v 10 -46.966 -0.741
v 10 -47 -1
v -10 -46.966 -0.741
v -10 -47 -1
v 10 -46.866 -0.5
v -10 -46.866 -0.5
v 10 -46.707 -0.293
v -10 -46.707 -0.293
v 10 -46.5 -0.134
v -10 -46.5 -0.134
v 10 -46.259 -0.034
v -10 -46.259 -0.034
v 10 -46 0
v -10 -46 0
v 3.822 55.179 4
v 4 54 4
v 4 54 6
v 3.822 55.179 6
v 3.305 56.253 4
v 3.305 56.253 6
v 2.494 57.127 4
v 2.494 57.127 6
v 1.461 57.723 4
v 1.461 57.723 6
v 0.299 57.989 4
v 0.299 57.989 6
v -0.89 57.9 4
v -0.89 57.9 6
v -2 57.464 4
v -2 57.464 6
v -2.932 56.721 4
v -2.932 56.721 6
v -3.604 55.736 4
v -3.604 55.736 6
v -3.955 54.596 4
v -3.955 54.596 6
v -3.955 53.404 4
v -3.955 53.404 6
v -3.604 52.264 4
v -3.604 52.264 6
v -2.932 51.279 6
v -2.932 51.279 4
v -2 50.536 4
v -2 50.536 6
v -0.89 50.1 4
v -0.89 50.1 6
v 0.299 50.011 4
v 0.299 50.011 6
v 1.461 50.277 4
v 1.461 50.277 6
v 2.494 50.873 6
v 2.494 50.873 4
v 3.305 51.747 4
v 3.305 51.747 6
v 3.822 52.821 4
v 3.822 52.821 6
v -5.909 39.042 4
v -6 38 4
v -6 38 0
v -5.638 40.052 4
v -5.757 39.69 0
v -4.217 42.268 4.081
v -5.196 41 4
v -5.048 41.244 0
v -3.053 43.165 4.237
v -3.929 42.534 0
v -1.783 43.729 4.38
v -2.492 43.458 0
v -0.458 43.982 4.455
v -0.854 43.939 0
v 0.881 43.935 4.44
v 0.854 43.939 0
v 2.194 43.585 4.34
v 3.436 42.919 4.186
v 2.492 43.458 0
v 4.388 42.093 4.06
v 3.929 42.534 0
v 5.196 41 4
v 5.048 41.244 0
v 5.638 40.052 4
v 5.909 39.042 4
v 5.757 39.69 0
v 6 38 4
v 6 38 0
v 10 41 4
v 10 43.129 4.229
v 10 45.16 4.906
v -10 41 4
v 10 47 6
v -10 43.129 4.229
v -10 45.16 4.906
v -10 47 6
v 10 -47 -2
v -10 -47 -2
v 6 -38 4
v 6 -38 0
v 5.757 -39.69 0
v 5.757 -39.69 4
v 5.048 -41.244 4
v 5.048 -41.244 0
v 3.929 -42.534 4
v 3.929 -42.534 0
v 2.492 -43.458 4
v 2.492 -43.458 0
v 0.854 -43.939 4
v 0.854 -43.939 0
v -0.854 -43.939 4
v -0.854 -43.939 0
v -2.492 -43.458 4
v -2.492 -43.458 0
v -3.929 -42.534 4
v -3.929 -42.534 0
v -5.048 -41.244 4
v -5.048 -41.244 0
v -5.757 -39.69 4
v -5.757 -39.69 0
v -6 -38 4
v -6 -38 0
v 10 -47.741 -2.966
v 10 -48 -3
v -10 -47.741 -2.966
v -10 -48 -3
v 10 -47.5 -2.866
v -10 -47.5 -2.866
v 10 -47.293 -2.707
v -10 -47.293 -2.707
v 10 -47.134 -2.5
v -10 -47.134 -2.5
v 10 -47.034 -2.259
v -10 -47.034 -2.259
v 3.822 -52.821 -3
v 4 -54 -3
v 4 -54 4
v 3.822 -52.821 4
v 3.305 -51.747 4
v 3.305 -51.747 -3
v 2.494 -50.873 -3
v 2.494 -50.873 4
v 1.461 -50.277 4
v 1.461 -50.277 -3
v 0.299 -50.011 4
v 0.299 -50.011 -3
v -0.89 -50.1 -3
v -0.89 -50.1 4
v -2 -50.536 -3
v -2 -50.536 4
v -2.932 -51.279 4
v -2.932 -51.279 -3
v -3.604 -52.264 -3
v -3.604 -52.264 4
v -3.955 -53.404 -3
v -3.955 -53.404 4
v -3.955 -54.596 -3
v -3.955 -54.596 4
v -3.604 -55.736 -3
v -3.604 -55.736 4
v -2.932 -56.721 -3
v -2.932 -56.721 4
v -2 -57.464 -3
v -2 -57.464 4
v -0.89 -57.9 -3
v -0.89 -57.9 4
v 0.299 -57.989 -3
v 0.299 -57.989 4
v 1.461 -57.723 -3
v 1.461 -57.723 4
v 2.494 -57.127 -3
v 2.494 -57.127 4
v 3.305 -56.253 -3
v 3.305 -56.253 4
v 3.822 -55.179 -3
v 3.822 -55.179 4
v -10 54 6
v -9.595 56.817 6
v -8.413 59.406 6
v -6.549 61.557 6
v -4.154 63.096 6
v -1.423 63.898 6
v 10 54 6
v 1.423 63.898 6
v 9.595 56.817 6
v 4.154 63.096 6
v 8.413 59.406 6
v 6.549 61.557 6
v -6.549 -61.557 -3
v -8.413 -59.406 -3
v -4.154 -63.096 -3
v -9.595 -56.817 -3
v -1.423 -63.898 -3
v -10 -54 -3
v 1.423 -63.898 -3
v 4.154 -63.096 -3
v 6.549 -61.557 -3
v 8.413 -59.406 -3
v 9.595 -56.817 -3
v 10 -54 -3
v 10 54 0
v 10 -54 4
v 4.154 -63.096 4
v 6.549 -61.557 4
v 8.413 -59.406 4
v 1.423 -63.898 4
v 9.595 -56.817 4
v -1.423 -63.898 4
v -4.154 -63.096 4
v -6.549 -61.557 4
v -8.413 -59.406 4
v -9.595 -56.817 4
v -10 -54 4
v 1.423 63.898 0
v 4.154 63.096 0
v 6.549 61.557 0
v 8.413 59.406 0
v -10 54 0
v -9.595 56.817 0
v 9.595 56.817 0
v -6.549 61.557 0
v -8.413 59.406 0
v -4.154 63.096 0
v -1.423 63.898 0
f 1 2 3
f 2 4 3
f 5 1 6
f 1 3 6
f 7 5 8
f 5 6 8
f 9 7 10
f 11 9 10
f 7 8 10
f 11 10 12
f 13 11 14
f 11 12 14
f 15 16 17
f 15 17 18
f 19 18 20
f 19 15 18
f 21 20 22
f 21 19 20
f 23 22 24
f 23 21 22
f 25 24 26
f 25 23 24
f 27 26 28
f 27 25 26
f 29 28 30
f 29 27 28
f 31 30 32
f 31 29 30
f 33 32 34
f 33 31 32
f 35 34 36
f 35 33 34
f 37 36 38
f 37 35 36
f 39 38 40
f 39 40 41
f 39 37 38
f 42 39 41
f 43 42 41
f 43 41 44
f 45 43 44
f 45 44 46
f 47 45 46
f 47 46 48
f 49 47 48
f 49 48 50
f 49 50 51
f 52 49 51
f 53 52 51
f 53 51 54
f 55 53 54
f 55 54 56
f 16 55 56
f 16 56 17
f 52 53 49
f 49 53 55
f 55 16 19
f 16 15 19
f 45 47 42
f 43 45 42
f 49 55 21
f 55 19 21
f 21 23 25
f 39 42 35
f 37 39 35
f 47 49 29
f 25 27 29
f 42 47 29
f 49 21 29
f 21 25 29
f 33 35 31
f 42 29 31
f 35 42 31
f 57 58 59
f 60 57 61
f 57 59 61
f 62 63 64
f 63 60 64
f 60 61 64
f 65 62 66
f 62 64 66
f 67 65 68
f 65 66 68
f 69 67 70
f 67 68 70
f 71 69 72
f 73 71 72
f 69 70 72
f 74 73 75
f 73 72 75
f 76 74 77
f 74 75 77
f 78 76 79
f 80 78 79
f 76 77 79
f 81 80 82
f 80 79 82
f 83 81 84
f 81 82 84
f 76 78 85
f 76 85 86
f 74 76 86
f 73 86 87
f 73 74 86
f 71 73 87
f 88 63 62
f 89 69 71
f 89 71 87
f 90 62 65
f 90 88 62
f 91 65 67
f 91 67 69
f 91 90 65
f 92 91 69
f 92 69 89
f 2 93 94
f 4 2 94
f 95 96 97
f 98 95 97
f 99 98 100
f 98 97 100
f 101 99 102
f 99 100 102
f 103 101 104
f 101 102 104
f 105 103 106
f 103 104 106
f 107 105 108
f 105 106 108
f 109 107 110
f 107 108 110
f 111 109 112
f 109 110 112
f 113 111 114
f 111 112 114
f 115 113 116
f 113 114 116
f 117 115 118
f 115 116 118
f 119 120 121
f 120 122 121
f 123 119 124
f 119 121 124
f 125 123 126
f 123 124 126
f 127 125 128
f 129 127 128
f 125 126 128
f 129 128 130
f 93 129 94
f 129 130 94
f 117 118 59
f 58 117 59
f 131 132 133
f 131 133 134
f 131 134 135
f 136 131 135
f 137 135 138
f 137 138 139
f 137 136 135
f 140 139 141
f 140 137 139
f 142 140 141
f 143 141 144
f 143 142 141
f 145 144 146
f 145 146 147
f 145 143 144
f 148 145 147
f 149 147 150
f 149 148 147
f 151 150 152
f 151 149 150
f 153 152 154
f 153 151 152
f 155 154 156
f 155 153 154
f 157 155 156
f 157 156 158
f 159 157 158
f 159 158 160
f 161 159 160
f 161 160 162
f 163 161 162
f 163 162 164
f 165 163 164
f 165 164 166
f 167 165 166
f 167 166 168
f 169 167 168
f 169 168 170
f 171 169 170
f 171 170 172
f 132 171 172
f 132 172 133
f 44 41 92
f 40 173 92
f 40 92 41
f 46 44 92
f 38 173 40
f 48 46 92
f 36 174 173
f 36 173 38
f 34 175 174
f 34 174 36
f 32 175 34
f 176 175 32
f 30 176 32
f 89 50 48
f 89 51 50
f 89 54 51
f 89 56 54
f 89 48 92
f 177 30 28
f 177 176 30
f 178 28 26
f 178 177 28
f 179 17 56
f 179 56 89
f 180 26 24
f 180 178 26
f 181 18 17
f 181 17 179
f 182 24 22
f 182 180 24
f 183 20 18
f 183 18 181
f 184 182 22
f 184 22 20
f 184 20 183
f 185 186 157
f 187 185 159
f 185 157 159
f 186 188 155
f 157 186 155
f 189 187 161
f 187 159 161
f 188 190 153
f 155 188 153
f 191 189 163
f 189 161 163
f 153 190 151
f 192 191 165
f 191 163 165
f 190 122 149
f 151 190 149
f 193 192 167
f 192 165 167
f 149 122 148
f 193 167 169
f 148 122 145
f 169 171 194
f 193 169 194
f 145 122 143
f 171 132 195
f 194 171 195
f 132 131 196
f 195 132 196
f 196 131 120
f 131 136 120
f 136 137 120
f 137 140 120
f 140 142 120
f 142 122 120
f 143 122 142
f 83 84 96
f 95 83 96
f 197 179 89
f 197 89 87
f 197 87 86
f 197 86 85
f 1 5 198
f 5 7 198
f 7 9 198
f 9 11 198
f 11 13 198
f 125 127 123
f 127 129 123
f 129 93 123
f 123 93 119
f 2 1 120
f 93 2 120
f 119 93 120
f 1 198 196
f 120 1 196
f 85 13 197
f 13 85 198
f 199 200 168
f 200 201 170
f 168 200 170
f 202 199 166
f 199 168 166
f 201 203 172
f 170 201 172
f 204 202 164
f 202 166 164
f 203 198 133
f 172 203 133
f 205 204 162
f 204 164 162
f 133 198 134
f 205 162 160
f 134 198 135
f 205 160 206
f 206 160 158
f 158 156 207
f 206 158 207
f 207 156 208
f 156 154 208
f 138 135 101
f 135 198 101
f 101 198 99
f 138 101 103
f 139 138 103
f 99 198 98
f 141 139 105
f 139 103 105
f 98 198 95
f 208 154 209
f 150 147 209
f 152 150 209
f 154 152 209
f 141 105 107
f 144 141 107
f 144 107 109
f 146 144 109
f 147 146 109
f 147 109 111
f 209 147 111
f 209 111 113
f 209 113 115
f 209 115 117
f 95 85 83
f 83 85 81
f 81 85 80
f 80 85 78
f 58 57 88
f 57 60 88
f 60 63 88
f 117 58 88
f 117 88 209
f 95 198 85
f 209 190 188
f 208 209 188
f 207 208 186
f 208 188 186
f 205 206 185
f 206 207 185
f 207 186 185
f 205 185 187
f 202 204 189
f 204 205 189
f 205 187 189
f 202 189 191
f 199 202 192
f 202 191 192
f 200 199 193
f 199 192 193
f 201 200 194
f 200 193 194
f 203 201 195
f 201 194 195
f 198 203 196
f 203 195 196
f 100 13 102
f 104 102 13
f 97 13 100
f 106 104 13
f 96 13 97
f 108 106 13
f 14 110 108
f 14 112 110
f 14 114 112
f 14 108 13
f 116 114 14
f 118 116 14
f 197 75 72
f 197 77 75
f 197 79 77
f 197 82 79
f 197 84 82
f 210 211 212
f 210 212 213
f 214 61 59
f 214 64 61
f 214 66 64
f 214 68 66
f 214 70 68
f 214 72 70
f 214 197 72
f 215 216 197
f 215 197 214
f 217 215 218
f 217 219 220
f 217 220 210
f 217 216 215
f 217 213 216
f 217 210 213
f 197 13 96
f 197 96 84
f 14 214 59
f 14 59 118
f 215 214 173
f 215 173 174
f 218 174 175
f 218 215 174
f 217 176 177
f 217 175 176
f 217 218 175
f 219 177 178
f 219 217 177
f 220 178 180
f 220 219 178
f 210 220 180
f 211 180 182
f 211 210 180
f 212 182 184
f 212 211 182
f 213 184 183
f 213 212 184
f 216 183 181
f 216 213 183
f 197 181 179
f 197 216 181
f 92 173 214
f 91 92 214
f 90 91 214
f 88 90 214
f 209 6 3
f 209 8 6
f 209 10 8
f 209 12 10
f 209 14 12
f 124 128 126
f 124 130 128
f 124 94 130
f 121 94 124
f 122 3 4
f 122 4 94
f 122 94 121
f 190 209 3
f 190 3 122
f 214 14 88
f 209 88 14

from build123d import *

# Parameters (mm, degrees)
CROQUIS1_R              = 4
SALIENTE_EXTRUIR1_DEPTH = 4
SALIENTE_EXTRUIR2_START = -3
CROQUIS1_5_R            = 4
SALIENTE_EXTRUIR2_DEPTH = 3
REDONDEO2_R             = 1
CROQUIS1_6_R            = 4
SALIENTE_EXTRUIR3_DEPTH = 6
REDONDEO1_R             = 10


with BuildPart() as part:
    # Croquis1 → Saliente-Extruir1 (new body)
    with BuildSketch(Plane.XY):
        with BuildLine():
            Line((10, 54), (10, -54))
            ThreePointArc((10, -54), (0, -64), (-10, -54))
            Line((-10, -54), (-10, 54))
            ThreePointArc((-10, 54), (0, 64), (10, 54))
        make_face()
        with Locations((0, -54)):
            Circle(CROQUIS1_R, mode=Mode.SUBTRACT)
        with BuildLine():
            Line((6, 38), (6, -38))
            ThreePointArc((6, -38), (0, -44), (-6, -38))
            Line((-6, -38), (-6, 38))
            ThreePointArc((-6, 38), (0, 44), (6, 38))
        make_face(mode=Mode.SUBTRACT)
    extrude(amount=SALIENTE_EXTRUIR1_DEPTH)

    # Croquis1<5> → Saliente-Extruir2 (add)
    with BuildSketch(Plane.XY.offset(SALIENTE_EXTRUIR2_START)):
        with BuildLine():
            Line((10, -54), (10, -47))
            Line((10, -47), (-10, -47))
            Line((-10, -47), (-10, -54))
            ThreePointArc((-10, -54), (0, -64), (10, -54))
        make_face()
        with Locations((0, -54)):
            Circle(CROQUIS1_5_R, mode=Mode.SUBTRACT)
    extrude(amount=SALIENTE_EXTRUIR2_DEPTH)

    # Redondeo2
    redondeo2_edges = [part.edges().sort_by_distance(p)[0] for p in [
        (0, -47, 0),
        (0, -47, -3),
    ]]
    fillet(redondeo2_edges, radius=REDONDEO2_R)

    # Croquis1<6> → Saliente-Extruir3 (add)
    with BuildSketch(Plane.XY):
        with BuildLine():
            Line((10, 47), (10, 54))
            ThreePointArc((10, 54), (0, 64), (-10, 54))
            Line((-10, 54), (-10, 47))
            Line((-10, 47), (10, 47))
        make_face()
        with Locations((0, 54)):
            Circle(CROQUIS1_6_R, mode=Mode.SUBTRACT)
    extrude(amount=SALIENTE_EXTRUIR3_DEPTH)

    # Redondeo1
    # the kernel refuses this fillet: 10 mm, written as the material it adds along each edge
    with BuildSketch(Plane(origin=(-10, 47, 4), x_dir=(0, 0, 1), z_dir=(1, 0, 0))) as redondeo1_piece_1_section:
        with BuildLine():
            CenterArc((10, 6), REDONDEO1_R, 180, 36.869897646)
            Line((0, 6), (-0.2, 6))
            Line((-0.2, 6), (-0.2, 0))
            Line((-0.2, 0), (0, -0.2))
            ThreePointArc((0, -0.2), (1, -0.2), (1.84, -0.12))
            Line((1.84, -0.12), (2, 0))
        make_face()
    redondeo1_piece_1 = extrude(amount=20, mode=Mode.PRIVATE)
    redondeo1_piece_1 = redondeo1_piece_1 - Plane(origin=(0, 38, 4.484524187), x_dir=(-1, 0, 0), z_dir=(0, 0, -1)) * Cylinder(6, 65, mode=Mode.PRIVATE)
    add(redondeo1_piece_1)


solid = part.part
